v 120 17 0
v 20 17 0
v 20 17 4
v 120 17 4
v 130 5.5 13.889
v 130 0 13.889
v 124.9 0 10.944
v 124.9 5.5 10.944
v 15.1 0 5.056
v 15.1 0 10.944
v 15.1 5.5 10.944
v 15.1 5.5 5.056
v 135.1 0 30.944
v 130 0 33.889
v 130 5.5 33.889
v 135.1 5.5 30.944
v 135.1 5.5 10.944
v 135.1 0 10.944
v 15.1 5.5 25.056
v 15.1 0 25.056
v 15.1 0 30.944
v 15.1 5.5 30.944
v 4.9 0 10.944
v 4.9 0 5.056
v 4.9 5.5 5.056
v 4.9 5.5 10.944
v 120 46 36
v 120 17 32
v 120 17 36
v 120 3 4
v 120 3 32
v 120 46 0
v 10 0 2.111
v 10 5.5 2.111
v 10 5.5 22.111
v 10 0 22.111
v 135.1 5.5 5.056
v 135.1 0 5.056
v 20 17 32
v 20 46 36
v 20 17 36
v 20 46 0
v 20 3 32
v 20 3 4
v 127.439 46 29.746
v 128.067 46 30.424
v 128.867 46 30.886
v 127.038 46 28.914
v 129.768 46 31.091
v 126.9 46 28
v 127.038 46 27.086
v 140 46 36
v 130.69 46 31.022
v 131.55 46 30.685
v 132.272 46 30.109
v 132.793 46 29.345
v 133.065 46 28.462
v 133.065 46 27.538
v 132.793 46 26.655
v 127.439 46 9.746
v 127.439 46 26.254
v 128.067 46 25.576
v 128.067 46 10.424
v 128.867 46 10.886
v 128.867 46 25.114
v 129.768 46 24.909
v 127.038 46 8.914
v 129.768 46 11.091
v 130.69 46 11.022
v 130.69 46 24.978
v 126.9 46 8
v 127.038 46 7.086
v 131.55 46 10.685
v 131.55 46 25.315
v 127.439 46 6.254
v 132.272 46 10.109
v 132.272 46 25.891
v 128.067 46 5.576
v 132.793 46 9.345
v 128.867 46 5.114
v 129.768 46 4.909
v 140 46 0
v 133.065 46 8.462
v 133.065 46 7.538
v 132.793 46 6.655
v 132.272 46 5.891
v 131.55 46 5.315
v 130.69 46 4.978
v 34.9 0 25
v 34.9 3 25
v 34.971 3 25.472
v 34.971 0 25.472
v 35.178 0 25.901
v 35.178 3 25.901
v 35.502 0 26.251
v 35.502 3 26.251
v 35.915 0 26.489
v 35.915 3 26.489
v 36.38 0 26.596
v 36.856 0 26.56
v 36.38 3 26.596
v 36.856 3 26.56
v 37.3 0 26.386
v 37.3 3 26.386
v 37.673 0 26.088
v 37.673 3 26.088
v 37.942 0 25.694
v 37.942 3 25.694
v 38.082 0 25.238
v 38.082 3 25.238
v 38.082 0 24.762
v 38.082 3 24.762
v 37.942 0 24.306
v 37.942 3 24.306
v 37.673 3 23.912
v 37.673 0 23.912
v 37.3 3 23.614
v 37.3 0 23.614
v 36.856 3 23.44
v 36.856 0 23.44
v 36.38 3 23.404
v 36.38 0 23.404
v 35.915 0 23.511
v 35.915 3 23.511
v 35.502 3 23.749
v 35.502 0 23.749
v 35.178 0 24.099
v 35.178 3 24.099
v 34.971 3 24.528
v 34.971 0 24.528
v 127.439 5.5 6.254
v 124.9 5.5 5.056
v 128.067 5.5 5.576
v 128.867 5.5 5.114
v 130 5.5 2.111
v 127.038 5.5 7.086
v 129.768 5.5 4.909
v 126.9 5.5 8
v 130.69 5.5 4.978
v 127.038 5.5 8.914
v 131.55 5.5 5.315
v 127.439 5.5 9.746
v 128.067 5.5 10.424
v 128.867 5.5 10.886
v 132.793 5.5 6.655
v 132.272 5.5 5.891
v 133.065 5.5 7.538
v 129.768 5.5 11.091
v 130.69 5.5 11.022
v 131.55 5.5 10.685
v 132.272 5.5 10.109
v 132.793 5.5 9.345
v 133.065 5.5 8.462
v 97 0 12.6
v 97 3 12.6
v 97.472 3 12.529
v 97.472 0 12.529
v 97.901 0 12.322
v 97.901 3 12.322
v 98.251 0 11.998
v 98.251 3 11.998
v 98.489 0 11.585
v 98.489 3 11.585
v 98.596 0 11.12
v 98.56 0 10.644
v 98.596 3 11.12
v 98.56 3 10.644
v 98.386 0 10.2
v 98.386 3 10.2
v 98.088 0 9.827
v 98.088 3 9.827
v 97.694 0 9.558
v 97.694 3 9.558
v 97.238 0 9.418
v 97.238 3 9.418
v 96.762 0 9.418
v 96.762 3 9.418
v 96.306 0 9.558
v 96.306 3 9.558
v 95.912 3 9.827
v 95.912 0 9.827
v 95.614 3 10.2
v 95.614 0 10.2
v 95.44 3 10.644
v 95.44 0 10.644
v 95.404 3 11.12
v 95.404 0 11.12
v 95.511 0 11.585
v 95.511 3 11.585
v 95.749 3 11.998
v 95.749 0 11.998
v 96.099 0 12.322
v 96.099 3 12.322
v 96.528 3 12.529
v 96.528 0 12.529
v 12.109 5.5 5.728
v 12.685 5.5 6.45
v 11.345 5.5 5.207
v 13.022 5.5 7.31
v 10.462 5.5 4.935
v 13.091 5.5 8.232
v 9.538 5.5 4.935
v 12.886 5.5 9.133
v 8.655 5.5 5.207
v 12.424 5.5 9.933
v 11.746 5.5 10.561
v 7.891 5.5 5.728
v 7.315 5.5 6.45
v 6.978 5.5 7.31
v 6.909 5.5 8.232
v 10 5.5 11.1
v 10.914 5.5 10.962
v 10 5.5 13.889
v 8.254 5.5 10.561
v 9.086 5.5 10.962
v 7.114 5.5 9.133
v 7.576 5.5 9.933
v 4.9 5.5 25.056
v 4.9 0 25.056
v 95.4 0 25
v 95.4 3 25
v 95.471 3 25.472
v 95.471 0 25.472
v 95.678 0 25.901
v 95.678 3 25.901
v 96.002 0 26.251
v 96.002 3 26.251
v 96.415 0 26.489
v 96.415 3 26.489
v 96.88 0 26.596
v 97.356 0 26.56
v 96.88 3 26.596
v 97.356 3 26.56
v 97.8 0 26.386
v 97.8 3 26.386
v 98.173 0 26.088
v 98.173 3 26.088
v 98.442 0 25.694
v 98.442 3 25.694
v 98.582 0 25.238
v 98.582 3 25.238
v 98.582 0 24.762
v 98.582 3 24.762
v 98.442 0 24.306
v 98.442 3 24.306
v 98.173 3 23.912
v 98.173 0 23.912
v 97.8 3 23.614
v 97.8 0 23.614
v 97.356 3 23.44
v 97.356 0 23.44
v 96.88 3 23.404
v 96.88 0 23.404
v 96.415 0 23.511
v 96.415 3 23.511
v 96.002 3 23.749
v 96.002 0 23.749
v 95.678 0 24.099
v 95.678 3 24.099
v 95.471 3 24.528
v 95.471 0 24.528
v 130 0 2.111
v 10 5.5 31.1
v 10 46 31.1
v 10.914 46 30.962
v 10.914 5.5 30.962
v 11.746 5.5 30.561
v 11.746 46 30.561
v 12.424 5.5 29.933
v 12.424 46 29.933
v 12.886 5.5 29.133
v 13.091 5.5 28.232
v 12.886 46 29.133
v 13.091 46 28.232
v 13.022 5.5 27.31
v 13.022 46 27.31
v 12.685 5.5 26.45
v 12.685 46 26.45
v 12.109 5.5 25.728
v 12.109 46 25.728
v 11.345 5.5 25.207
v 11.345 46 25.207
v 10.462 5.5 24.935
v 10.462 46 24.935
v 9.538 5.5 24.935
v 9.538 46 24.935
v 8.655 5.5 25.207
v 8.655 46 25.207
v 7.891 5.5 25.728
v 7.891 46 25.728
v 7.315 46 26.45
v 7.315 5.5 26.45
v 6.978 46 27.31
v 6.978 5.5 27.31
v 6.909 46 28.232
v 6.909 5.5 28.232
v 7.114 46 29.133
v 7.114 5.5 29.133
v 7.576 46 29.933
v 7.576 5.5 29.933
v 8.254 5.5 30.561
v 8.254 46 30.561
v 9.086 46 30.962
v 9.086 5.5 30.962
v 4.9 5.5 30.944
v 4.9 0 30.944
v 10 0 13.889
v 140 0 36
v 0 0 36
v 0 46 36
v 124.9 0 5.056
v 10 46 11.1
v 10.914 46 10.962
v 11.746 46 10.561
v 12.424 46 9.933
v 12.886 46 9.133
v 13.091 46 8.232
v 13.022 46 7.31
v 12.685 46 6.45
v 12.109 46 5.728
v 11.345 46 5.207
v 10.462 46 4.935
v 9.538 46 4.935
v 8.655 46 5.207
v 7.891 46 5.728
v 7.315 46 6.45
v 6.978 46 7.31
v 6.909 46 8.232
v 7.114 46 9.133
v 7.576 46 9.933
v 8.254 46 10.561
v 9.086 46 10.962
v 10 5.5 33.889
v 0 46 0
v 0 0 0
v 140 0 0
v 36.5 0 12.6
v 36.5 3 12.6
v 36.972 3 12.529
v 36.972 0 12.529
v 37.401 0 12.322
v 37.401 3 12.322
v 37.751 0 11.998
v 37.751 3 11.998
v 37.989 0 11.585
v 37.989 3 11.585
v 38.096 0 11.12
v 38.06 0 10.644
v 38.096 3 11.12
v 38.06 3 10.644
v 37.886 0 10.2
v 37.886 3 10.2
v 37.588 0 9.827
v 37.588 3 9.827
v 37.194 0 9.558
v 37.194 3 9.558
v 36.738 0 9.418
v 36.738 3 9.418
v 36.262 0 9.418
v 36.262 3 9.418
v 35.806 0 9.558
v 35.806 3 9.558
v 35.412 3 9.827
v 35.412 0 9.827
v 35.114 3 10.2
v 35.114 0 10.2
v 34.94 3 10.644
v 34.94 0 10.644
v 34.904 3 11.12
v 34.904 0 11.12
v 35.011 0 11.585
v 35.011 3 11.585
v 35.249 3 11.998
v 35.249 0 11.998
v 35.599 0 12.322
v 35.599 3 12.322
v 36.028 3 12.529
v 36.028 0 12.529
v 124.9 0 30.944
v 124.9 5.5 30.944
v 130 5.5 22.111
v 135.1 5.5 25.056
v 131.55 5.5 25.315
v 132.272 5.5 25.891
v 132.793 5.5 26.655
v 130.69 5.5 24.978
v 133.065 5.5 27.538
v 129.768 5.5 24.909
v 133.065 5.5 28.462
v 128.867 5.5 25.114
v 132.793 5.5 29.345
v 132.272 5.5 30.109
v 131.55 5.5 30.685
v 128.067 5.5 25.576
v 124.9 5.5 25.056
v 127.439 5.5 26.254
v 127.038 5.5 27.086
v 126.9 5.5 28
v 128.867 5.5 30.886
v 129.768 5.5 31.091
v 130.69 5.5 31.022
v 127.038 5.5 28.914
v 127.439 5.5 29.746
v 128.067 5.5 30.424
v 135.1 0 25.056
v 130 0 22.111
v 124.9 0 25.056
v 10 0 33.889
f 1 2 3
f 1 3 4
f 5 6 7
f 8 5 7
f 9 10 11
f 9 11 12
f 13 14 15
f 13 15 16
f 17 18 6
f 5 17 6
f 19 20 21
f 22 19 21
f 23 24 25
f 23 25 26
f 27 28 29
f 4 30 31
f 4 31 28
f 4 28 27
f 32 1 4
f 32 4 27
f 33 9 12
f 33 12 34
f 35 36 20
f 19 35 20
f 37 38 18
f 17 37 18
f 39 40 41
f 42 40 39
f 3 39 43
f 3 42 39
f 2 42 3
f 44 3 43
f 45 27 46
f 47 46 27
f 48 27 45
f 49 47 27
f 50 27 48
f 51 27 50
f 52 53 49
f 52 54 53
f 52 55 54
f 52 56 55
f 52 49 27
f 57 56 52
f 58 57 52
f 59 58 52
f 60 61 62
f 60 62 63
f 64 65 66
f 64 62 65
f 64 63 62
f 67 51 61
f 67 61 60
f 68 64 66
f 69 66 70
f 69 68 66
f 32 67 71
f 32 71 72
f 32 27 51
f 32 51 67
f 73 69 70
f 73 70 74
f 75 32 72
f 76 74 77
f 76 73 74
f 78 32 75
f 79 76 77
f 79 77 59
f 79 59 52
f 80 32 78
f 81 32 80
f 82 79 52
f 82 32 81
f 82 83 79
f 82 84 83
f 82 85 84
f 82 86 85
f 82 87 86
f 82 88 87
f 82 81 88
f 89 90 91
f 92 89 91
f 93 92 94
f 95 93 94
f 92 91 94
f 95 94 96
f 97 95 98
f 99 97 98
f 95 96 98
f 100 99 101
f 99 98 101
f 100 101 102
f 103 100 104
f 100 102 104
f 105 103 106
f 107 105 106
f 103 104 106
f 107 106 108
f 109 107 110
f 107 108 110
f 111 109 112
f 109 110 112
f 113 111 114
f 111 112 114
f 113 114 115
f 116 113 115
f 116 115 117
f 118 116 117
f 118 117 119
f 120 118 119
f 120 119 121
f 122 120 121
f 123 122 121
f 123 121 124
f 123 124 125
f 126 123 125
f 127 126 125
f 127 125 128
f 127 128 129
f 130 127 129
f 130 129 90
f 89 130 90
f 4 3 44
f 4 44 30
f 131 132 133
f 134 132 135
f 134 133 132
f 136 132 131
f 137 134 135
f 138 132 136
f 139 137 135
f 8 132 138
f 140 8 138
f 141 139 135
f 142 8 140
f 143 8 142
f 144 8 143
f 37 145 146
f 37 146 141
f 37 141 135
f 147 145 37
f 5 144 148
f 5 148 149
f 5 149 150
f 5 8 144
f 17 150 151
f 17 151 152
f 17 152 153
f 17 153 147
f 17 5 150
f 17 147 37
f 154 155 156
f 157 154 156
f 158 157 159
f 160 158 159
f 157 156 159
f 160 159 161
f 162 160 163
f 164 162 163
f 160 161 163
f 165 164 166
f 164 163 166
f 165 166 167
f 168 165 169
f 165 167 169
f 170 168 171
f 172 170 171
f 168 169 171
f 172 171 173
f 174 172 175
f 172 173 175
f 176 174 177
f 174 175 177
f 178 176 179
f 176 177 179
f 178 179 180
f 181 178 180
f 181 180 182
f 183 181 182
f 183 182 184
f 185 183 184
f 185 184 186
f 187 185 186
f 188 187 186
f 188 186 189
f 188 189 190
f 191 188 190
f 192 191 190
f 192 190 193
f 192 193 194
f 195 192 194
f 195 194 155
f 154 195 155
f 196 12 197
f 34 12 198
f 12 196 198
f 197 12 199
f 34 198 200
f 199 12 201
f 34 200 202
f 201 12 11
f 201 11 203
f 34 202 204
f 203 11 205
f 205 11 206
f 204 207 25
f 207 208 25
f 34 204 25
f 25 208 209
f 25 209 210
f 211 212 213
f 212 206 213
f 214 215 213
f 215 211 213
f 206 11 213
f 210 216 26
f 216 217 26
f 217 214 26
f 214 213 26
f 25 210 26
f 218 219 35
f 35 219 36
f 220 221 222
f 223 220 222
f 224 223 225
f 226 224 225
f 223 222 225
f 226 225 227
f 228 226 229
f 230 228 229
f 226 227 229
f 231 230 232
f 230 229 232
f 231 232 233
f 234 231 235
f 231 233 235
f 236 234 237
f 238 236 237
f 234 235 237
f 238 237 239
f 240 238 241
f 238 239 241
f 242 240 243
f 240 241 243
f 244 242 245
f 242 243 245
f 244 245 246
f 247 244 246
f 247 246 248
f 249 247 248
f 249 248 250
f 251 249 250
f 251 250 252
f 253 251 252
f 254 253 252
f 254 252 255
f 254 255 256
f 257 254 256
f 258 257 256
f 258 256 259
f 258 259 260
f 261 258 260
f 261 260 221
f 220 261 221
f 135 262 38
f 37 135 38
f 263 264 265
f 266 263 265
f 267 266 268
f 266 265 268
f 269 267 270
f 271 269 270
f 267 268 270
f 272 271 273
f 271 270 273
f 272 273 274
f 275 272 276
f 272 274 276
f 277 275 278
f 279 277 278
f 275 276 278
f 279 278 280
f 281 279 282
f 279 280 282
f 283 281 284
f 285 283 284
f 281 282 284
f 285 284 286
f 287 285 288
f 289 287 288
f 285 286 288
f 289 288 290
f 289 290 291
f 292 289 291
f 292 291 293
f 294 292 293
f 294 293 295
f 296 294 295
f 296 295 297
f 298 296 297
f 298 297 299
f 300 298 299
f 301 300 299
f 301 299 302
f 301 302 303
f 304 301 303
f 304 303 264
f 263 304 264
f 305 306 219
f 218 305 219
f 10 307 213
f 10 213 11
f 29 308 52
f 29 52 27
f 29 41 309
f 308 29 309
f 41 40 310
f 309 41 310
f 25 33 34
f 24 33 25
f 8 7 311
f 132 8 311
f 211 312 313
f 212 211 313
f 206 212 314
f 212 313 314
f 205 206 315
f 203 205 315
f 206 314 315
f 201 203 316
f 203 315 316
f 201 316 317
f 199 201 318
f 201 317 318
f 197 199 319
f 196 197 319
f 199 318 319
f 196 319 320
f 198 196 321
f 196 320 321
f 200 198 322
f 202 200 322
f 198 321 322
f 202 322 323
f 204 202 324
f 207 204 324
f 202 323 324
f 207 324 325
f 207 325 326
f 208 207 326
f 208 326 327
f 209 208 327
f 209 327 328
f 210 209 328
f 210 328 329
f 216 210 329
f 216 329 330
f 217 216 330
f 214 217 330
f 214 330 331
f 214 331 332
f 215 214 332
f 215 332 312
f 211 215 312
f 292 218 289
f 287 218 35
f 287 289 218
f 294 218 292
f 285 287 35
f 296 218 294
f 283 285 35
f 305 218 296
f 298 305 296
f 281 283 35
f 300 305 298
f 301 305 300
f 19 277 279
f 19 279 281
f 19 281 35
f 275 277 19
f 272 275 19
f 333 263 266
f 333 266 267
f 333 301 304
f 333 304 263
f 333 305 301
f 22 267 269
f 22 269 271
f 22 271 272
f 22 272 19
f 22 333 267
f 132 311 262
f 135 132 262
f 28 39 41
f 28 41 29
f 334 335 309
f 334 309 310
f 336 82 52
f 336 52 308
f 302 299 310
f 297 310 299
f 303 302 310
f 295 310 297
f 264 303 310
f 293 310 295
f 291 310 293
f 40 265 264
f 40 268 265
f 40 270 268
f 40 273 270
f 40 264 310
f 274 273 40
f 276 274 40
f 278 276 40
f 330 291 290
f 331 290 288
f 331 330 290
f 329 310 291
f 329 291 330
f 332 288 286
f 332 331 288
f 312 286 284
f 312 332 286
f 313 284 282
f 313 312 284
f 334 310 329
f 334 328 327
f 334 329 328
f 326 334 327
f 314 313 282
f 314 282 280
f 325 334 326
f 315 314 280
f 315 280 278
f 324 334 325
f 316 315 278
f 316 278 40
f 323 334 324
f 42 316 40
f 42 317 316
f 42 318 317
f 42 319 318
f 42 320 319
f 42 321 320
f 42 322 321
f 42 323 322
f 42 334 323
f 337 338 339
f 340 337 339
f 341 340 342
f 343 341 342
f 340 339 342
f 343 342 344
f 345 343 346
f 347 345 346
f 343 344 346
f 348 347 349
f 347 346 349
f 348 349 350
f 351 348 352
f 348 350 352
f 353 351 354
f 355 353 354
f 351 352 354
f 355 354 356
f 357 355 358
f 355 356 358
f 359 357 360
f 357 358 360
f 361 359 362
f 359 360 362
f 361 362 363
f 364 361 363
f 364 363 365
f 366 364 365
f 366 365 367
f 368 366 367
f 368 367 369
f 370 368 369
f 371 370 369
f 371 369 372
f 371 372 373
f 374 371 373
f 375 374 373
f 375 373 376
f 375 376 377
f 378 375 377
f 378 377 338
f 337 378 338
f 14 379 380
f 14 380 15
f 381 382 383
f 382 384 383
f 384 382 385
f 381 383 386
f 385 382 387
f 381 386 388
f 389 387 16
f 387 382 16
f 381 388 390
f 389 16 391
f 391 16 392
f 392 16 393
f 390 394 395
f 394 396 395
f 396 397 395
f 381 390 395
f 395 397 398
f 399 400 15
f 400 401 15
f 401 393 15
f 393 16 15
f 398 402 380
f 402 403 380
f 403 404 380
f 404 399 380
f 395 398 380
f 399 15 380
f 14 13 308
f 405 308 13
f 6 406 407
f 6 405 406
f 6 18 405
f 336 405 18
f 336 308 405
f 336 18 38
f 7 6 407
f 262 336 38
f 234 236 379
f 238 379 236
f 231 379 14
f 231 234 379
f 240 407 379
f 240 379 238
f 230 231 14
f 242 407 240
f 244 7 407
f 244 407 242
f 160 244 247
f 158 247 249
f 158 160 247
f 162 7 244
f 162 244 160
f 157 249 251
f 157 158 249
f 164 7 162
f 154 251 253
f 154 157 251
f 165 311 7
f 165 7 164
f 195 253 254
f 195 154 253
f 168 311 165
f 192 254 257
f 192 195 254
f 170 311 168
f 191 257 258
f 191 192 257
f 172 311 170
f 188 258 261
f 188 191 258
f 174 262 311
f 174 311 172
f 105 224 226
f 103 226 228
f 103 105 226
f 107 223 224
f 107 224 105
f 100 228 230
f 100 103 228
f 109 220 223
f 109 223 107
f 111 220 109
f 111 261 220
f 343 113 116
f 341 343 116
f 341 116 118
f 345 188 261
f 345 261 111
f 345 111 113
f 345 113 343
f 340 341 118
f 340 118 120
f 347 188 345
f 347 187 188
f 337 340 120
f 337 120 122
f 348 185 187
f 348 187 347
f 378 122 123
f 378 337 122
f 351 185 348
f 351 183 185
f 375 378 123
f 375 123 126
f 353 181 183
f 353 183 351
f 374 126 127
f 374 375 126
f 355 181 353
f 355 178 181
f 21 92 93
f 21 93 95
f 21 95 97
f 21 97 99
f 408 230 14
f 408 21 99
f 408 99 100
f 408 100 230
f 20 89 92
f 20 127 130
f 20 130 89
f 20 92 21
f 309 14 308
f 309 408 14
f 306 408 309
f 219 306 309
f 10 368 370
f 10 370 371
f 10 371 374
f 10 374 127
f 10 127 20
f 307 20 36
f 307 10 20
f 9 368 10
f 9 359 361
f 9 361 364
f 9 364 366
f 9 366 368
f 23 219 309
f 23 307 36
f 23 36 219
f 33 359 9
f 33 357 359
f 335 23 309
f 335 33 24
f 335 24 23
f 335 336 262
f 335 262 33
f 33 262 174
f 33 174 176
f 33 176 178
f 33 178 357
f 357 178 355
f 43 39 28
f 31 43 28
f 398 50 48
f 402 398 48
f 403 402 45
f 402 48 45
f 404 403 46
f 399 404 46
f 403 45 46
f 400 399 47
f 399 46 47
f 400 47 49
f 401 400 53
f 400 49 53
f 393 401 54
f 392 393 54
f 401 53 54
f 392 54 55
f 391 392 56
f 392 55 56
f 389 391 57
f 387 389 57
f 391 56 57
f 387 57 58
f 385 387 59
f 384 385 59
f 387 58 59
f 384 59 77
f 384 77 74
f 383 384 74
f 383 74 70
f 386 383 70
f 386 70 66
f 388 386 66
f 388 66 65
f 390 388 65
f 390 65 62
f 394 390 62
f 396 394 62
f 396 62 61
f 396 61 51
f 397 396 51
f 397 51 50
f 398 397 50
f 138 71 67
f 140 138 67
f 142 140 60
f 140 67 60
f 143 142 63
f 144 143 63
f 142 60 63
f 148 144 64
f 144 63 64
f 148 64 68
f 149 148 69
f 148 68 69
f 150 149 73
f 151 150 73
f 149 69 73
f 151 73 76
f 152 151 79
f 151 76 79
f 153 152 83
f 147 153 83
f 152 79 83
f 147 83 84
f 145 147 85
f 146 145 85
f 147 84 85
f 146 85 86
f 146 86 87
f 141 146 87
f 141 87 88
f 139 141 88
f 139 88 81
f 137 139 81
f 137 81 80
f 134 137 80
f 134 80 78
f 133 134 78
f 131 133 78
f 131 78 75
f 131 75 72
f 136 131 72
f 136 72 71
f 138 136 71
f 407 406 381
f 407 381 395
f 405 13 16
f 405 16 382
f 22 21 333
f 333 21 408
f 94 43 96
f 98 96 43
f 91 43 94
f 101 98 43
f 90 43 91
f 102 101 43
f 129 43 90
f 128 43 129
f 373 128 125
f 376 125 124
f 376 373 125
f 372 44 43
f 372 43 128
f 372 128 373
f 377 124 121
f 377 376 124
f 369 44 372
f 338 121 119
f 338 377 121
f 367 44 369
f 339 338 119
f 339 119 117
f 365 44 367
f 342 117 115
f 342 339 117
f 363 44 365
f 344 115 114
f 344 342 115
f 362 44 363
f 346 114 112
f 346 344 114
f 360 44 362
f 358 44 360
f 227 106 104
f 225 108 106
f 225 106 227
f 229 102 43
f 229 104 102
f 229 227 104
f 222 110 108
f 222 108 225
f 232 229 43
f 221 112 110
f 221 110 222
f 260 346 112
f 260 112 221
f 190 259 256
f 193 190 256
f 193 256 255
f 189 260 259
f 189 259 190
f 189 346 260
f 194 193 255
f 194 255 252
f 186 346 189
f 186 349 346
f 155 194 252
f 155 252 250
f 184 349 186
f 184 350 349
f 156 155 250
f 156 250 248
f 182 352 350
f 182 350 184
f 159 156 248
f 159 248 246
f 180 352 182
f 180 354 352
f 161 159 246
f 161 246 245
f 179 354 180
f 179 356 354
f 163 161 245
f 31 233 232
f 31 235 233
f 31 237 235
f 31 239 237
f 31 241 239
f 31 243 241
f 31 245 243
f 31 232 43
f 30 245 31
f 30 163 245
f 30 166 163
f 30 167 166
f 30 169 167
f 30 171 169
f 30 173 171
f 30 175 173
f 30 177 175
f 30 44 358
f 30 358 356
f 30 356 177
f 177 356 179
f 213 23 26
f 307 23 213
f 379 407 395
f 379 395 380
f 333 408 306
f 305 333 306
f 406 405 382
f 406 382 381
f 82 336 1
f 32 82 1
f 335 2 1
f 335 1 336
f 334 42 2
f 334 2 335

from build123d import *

# Parameters (mm, degrees)
BOSS_EXTRU_1_DEPTH      = 36
ESQUISSE6_W             = 100
ESQUISSE6_H             = 28
ENL_V_MAT_EXTRU_1_DEPTH = 14
ENL_V_MAT_EXTRU_2_REACH = 152.814
ESQUISSE7_R             = 1.6
ENL_V_MAT_EXTRU_3_REACH = 153.697
ESQUISSE8_R             = 3.1
ENL_V_MAT_EXTRU_4_DEPTH = 5.5


with BuildPart() as part:
    # Esquisse5 → Boss.-Extru.1 (new body)
    with BuildSketch(Plane.XY):
        Polygon((0, 0), (0, 46), (20, 46), (20, 17), (120, 17), (120, 46), (140, 46), (140, 0), align=None)
    extrude(amount=BOSS_EXTRU_1_DEPTH)

    # Esquisse6 → Enlèv. mat.-Extru.1 (cut)
    with BuildSketch(Plane(origin=(0, 17, 0), x_dir=(1, 0, 0), z_dir=(0, 1, 0))):
        with Locations((70, -18)):
            Rectangle(ESQUISSE6_W, ESQUISSE6_H)
    extrude(amount=-ENL_V_MAT_EXTRU_1_DEPTH, mode=Mode.SUBTRACT)

    # Esquisse7 → Enlèv. mat.-Extru.2 (cut, up to next)
    with BuildSketch(Plane(origin=(0, 3, 0), x_dir=(1, 0, 0), z_dir=(0, 1, 0)), mode=Mode.PRIVATE) as enl_v_mat_extru_2_sk1:
        with Locations(Location((36.5, -11, 0), (0, 0, 270))):
            Circle(ESQUISSE7_R)
    enl_v_mat_extru_2_tool1 = extrude(enl_v_mat_extru_2_sk1.sketch, amount=-ENL_V_MAT_EXTRU_2_REACH, mode=Mode.PRIVATE) & part.part
    # Esquisse7 → Enlèv. mat.-Extru.2 (cut, up to next)
    with BuildSketch(Plane(origin=(0, 3, 0), x_dir=(1, 0, 0), z_dir=(0, 1, 0)), mode=Mode.PRIVATE) as enl_v_mat_extru_2_sk2:
        with Locations(Location((97, -11, 0), (0, 0, 270))):
            Circle(ESQUISSE7_R)
    enl_v_mat_extru_2_tool2 = extrude(enl_v_mat_extru_2_sk2.sketch, amount=-ENL_V_MAT_EXTRU_2_REACH, mode=Mode.PRIVATE) & part.part
    # Esquisse7 → Enlèv. mat.-Extru.2 (cut, up to next)
    with BuildSketch(Plane(origin=(0, 3, 0), x_dir=(1, 0, 0), z_dir=(0, 1, 0)), mode=Mode.PRIVATE) as enl_v_mat_extru_2_sk3:
        with Locations(Location((97, -25, 0), (0, 0, 180))):
            Circle(ESQUISSE7_R)
    enl_v_mat_extru_2_tool3 = extrude(enl_v_mat_extru_2_sk3.sketch, amount=-ENL_V_MAT_EXTRU_2_REACH, mode=Mode.PRIVATE) & part.part
    # Esquisse7 → Enlèv. mat.-Extru.2 (cut, up to next)
    with BuildSketch(Plane(origin=(0, 3, 0), x_dir=(1, 0, 0), z_dir=(0, 1, 0)), mode=Mode.PRIVATE) as enl_v_mat_extru_2_sk4:
        with Locations(Location((36.5, -25, 0), (0, 0, 180))):
            Circle(ESQUISSE7_R)
    enl_v_mat_extru_2_tool4 = extrude(enl_v_mat_extru_2_sk4.sketch, amount=-ENL_V_MAT_EXTRU_2_REACH, mode=Mode.PRIVATE) & part.part
    add(enl_v_mat_extru_2_tool1.solids().sort_by_distance((36.5, 3, 11))[0], mode=Mode.SUBTRACT)
    add(enl_v_mat_extru_2_tool2.solids().sort_by_distance((97, 3, 11))[0], mode=Mode.SUBTRACT)
    add(enl_v_mat_extru_2_tool3.solids().sort_by_distance((97, 3, 25))[0], mode=Mode.SUBTRACT)
    add(enl_v_mat_extru_2_tool4.solids().sort_by_distance((36.5, 3, 25))[0], mode=Mode.SUBTRACT)

    # Esquisse8 → Enlèv. mat.-Extru.3 (cut, up to next)
    with BuildSketch(Plane(origin=(0, 46, 0), x_dir=(1, 0, 0), z_dir=(0, 1, 0)), mode=Mode.PRIVATE) as enl_v_mat_extru_3_sk1:
        with Locations(Location((10, -8, 0), (0, 0, 270))):
            Circle(ESQUISSE8_R)
    enl_v_mat_extru_3_tool1 = extrude(enl_v_mat_extru_3_sk1.sketch, amount=-ENL_V_MAT_EXTRU_3_REACH, mode=Mode.PRIVATE) & part.part
    # Esquisse8 → Enlèv. mat.-Extru.3 (cut, up to next)
    with BuildSketch(Plane(origin=(0, 46, 0), x_dir=(1, 0, 0), z_dir=(0, 1, 0)), mode=Mode.PRIVATE) as enl_v_mat_extru_3_sk2:
        with Locations(Location((10, -28, 0), (0, 0, 270))):
            Circle(ESQUISSE8_R)
    enl_v_mat_extru_3_tool2 = extrude(enl_v_mat_extru_3_sk2.sketch, amount=-ENL_V_MAT_EXTRU_3_REACH, mode=Mode.PRIVATE) & part.part
    # Esquisse8 → Enlèv. mat.-Extru.3 (cut, up to next)
    with BuildSketch(Plane(origin=(0, 46, 0), x_dir=(1, 0, 0), z_dir=(0, 1, 0)), mode=Mode.PRIVATE) as enl_v_mat_extru_3_sk3:
        with Locations(Location((130, -28, 0), (0, 0, 180))):
            Circle(ESQUISSE8_R)
    enl_v_mat_extru_3_tool3 = extrude(enl_v_mat_extru_3_sk3.sketch, amount=-ENL_V_MAT_EXTRU_3_REACH, mode=Mode.PRIVATE) & part.part
    # Esquisse8 → Enlèv. mat.-Extru.3 (cut, up to next)
    with BuildSketch(Plane(origin=(0, 46, 0), x_dir=(1, 0, 0), z_dir=(0, 1, 0)), mode=Mode.PRIVATE) as enl_v_mat_extru_3_sk4:
        with Locations(Location((130, -8, 0), (0, 0, 180))):
            Circle(ESQUISSE8_R)
    enl_v_mat_extru_3_tool4 = extrude(enl_v_mat_extru_3_sk4.sketch, amount=-ENL_V_MAT_EXTRU_3_REACH, mode=Mode.PRIVATE) & part.part
    add(enl_v_mat_extru_3_tool1.solids().sort_by_distance((10, 46, 8))[0], mode=Mode.SUBTRACT)
    add(enl_v_mat_extru_3_tool2.solids().sort_by_distance((10, 46, 28))[0], mode=Mode.SUBTRACT)
    add(enl_v_mat_extru_3_tool3.solids().sort_by_distance((130, 46, 28))[0], mode=Mode.SUBTRACT)
    add(enl_v_mat_extru_3_tool4.solids().sort_by_distance((130, 46, 8))[0], mode=Mode.SUBTRACT)

    # Esquisse9 → Enlèv. mat.-Extru.4 (cut)
    with BuildSketch(Plane.XZ):
        Polygon((124.9, 5.055513627), (130, 2.111027254), (135.1, 5.055513627), (135.1, 10.944486373), (130, 13.888972746), (124.9, 10.944486373), align=None)
        Polygon((124.9, 25.055513627), (124.9, 30.944486373), (130, 33.888972746), (135.1, 30.944486373), (135.1, 25.055513627), (130, 22.111027254), align=None)
        Polygon((15.1, 30.944486373), (10, 33.888972746), (4.9, 30.944486373), (4.9, 25.055513627), (10, 22.111027254), (15.1, 25.055513627), align=None)
        Polygon((15.1, 10.944486373), (15.1, 5.055513627), (10, 2.111027254), (4.9, 5.055513627), (4.9, 10.944486373), (10, 13.888972746), align=None)
    extrude(amount=-ENL_V_MAT_EXTRU_4_DEPTH, mode=Mode.SUBTRACT)


solid = part.part
